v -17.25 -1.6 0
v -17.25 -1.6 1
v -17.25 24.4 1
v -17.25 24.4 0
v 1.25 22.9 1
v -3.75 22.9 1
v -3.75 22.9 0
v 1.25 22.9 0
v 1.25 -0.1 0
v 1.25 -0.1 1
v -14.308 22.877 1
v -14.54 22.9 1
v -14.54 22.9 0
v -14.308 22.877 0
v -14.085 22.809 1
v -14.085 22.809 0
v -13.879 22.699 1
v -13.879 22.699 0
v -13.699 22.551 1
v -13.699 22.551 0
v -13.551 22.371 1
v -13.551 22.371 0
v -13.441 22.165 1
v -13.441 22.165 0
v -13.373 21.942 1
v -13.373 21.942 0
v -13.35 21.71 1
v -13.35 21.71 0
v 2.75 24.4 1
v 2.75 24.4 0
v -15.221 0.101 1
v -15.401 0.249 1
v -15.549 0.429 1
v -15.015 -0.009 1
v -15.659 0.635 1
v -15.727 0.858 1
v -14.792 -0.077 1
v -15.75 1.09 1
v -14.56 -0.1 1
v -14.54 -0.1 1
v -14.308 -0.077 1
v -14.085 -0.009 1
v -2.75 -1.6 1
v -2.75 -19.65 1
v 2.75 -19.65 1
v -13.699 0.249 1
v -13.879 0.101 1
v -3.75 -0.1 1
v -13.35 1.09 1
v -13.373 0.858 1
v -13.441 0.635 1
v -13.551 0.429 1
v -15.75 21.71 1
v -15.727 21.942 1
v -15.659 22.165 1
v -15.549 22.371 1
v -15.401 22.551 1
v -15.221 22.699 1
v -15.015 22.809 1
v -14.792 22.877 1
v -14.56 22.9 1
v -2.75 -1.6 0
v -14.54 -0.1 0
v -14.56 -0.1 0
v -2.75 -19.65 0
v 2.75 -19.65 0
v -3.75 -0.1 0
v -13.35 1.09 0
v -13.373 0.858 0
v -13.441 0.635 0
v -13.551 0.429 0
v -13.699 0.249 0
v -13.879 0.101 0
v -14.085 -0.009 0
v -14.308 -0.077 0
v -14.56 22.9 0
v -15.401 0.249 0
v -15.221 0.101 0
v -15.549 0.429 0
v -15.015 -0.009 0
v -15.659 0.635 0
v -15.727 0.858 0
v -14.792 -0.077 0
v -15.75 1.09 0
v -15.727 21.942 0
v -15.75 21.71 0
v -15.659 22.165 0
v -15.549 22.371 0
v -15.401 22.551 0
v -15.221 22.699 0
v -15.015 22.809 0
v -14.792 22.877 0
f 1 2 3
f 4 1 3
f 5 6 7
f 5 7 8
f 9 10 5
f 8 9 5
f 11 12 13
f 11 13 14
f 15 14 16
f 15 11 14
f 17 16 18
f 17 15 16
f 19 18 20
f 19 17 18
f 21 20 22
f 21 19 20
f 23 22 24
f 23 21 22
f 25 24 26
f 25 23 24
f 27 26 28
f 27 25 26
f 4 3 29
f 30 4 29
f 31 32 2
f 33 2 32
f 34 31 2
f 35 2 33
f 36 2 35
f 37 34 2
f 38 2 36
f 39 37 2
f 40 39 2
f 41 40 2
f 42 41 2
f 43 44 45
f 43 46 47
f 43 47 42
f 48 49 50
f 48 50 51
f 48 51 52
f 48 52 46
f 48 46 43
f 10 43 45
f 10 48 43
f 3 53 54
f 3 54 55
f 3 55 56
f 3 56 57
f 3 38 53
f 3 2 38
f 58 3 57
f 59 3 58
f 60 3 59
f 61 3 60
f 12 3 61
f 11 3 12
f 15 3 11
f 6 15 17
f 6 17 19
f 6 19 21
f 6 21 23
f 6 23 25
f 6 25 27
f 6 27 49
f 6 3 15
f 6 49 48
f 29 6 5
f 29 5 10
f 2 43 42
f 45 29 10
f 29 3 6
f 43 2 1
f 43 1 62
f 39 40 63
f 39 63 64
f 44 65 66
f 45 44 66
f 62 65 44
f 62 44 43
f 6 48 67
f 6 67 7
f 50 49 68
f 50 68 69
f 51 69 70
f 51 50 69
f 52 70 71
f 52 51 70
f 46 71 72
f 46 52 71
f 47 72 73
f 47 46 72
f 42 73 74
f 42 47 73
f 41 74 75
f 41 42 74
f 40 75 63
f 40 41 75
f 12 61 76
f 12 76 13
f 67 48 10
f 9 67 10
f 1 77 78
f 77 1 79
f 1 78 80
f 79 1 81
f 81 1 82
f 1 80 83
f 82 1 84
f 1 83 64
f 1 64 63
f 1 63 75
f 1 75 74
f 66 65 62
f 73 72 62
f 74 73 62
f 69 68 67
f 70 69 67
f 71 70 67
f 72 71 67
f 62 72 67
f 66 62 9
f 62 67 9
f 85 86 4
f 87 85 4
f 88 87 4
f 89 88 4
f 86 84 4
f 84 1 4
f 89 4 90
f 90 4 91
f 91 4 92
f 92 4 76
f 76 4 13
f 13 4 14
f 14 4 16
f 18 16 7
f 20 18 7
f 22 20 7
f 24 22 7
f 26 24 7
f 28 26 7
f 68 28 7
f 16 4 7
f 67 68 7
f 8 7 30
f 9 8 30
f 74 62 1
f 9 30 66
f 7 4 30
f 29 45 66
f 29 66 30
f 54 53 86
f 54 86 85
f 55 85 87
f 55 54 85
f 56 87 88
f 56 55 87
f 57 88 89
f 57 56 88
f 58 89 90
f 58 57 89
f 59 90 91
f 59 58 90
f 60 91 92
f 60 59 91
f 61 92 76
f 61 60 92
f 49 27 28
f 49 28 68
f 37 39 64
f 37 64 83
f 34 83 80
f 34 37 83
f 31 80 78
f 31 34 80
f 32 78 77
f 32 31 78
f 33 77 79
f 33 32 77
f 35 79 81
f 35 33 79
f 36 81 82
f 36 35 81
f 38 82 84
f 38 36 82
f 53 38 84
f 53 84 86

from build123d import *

# Parameters (mm, degrees)
SKETCH1_W           = 5.5
SKETCH1_H           = 39.3
BOSS_EXTRUDE1_DEPTH = 1
SKETCH3_W           = 20
SKETCH3_H           = 26
BOSS_EXTRUDE5_DEPTH = 1
CUT_EXTRUDE3_DEPTH  = 1
SKETCH5_W           = 5
SKETCH5_H           = 23
CUT_EXTRUDE4_DEPTH  = 1


with BuildPart() as part:
    # Sketch1 → Boss-Extrude1 (new body)
    with BuildSketch(Plane.XY):
        Rectangle(SKETCH1_W, SKETCH1_H)
    extrude(amount=BOSS_EXTRUDE1_DEPTH)

    # Sketch3 → Boss-Extrude5 (add)
    with BuildSketch(Plane.XY.offset(1)):
        with Locations((-7.25, 11.4)):
            Rectangle(SKETCH3_W, SKETCH3_H)
    extrude(amount=-BOSS_EXTRUDE5_DEPTH)

    # Sketch4 → Cut-Extrude3 (cut)
    with BuildSketch(Plane.XY.offset(1)):
        with BuildLine():
            Line((-14.56, 22.9), (-14.54, 22.9))
            ThreePointArc((-14.54, 22.9), (-13.69854293, 22.55145707), (-13.35, 21.71))
            Line((-13.35, 21.71), (-13.35, 1.09))
            ThreePointArc((-13.35, 1.09), (-13.69854293, 0.24854293), (-14.54, -0.1))
            Line((-14.54, -0.1), (-14.56, -0.1))
            ThreePointArc((-14.56, -0.1), (-15.40145707, 0.24854293), (-15.75, 1.09))
            Line((-15.75, 1.09), (-15.75, 21.71))
            ThreePointArc((-15.75, 21.71), (-15.40145707, 22.55145707), (-14.56, 22.9))
        make_face()
    extrude(amount=-CUT_EXTRUDE3_DEPTH, mode=Mode.SUBTRACT)

    # Sketch5 → Cut-Extrude4 (cut)
    with BuildSketch(Plane.XY.offset(1)):
        with Locations((-1.25, 11.4)):
            Rectangle(SKETCH5_W, SKETCH5_H)
    extrude(amount=-CUT_EXTRUDE4_DEPTH, mode=Mode.SUBTRACT)


solid = part.part
